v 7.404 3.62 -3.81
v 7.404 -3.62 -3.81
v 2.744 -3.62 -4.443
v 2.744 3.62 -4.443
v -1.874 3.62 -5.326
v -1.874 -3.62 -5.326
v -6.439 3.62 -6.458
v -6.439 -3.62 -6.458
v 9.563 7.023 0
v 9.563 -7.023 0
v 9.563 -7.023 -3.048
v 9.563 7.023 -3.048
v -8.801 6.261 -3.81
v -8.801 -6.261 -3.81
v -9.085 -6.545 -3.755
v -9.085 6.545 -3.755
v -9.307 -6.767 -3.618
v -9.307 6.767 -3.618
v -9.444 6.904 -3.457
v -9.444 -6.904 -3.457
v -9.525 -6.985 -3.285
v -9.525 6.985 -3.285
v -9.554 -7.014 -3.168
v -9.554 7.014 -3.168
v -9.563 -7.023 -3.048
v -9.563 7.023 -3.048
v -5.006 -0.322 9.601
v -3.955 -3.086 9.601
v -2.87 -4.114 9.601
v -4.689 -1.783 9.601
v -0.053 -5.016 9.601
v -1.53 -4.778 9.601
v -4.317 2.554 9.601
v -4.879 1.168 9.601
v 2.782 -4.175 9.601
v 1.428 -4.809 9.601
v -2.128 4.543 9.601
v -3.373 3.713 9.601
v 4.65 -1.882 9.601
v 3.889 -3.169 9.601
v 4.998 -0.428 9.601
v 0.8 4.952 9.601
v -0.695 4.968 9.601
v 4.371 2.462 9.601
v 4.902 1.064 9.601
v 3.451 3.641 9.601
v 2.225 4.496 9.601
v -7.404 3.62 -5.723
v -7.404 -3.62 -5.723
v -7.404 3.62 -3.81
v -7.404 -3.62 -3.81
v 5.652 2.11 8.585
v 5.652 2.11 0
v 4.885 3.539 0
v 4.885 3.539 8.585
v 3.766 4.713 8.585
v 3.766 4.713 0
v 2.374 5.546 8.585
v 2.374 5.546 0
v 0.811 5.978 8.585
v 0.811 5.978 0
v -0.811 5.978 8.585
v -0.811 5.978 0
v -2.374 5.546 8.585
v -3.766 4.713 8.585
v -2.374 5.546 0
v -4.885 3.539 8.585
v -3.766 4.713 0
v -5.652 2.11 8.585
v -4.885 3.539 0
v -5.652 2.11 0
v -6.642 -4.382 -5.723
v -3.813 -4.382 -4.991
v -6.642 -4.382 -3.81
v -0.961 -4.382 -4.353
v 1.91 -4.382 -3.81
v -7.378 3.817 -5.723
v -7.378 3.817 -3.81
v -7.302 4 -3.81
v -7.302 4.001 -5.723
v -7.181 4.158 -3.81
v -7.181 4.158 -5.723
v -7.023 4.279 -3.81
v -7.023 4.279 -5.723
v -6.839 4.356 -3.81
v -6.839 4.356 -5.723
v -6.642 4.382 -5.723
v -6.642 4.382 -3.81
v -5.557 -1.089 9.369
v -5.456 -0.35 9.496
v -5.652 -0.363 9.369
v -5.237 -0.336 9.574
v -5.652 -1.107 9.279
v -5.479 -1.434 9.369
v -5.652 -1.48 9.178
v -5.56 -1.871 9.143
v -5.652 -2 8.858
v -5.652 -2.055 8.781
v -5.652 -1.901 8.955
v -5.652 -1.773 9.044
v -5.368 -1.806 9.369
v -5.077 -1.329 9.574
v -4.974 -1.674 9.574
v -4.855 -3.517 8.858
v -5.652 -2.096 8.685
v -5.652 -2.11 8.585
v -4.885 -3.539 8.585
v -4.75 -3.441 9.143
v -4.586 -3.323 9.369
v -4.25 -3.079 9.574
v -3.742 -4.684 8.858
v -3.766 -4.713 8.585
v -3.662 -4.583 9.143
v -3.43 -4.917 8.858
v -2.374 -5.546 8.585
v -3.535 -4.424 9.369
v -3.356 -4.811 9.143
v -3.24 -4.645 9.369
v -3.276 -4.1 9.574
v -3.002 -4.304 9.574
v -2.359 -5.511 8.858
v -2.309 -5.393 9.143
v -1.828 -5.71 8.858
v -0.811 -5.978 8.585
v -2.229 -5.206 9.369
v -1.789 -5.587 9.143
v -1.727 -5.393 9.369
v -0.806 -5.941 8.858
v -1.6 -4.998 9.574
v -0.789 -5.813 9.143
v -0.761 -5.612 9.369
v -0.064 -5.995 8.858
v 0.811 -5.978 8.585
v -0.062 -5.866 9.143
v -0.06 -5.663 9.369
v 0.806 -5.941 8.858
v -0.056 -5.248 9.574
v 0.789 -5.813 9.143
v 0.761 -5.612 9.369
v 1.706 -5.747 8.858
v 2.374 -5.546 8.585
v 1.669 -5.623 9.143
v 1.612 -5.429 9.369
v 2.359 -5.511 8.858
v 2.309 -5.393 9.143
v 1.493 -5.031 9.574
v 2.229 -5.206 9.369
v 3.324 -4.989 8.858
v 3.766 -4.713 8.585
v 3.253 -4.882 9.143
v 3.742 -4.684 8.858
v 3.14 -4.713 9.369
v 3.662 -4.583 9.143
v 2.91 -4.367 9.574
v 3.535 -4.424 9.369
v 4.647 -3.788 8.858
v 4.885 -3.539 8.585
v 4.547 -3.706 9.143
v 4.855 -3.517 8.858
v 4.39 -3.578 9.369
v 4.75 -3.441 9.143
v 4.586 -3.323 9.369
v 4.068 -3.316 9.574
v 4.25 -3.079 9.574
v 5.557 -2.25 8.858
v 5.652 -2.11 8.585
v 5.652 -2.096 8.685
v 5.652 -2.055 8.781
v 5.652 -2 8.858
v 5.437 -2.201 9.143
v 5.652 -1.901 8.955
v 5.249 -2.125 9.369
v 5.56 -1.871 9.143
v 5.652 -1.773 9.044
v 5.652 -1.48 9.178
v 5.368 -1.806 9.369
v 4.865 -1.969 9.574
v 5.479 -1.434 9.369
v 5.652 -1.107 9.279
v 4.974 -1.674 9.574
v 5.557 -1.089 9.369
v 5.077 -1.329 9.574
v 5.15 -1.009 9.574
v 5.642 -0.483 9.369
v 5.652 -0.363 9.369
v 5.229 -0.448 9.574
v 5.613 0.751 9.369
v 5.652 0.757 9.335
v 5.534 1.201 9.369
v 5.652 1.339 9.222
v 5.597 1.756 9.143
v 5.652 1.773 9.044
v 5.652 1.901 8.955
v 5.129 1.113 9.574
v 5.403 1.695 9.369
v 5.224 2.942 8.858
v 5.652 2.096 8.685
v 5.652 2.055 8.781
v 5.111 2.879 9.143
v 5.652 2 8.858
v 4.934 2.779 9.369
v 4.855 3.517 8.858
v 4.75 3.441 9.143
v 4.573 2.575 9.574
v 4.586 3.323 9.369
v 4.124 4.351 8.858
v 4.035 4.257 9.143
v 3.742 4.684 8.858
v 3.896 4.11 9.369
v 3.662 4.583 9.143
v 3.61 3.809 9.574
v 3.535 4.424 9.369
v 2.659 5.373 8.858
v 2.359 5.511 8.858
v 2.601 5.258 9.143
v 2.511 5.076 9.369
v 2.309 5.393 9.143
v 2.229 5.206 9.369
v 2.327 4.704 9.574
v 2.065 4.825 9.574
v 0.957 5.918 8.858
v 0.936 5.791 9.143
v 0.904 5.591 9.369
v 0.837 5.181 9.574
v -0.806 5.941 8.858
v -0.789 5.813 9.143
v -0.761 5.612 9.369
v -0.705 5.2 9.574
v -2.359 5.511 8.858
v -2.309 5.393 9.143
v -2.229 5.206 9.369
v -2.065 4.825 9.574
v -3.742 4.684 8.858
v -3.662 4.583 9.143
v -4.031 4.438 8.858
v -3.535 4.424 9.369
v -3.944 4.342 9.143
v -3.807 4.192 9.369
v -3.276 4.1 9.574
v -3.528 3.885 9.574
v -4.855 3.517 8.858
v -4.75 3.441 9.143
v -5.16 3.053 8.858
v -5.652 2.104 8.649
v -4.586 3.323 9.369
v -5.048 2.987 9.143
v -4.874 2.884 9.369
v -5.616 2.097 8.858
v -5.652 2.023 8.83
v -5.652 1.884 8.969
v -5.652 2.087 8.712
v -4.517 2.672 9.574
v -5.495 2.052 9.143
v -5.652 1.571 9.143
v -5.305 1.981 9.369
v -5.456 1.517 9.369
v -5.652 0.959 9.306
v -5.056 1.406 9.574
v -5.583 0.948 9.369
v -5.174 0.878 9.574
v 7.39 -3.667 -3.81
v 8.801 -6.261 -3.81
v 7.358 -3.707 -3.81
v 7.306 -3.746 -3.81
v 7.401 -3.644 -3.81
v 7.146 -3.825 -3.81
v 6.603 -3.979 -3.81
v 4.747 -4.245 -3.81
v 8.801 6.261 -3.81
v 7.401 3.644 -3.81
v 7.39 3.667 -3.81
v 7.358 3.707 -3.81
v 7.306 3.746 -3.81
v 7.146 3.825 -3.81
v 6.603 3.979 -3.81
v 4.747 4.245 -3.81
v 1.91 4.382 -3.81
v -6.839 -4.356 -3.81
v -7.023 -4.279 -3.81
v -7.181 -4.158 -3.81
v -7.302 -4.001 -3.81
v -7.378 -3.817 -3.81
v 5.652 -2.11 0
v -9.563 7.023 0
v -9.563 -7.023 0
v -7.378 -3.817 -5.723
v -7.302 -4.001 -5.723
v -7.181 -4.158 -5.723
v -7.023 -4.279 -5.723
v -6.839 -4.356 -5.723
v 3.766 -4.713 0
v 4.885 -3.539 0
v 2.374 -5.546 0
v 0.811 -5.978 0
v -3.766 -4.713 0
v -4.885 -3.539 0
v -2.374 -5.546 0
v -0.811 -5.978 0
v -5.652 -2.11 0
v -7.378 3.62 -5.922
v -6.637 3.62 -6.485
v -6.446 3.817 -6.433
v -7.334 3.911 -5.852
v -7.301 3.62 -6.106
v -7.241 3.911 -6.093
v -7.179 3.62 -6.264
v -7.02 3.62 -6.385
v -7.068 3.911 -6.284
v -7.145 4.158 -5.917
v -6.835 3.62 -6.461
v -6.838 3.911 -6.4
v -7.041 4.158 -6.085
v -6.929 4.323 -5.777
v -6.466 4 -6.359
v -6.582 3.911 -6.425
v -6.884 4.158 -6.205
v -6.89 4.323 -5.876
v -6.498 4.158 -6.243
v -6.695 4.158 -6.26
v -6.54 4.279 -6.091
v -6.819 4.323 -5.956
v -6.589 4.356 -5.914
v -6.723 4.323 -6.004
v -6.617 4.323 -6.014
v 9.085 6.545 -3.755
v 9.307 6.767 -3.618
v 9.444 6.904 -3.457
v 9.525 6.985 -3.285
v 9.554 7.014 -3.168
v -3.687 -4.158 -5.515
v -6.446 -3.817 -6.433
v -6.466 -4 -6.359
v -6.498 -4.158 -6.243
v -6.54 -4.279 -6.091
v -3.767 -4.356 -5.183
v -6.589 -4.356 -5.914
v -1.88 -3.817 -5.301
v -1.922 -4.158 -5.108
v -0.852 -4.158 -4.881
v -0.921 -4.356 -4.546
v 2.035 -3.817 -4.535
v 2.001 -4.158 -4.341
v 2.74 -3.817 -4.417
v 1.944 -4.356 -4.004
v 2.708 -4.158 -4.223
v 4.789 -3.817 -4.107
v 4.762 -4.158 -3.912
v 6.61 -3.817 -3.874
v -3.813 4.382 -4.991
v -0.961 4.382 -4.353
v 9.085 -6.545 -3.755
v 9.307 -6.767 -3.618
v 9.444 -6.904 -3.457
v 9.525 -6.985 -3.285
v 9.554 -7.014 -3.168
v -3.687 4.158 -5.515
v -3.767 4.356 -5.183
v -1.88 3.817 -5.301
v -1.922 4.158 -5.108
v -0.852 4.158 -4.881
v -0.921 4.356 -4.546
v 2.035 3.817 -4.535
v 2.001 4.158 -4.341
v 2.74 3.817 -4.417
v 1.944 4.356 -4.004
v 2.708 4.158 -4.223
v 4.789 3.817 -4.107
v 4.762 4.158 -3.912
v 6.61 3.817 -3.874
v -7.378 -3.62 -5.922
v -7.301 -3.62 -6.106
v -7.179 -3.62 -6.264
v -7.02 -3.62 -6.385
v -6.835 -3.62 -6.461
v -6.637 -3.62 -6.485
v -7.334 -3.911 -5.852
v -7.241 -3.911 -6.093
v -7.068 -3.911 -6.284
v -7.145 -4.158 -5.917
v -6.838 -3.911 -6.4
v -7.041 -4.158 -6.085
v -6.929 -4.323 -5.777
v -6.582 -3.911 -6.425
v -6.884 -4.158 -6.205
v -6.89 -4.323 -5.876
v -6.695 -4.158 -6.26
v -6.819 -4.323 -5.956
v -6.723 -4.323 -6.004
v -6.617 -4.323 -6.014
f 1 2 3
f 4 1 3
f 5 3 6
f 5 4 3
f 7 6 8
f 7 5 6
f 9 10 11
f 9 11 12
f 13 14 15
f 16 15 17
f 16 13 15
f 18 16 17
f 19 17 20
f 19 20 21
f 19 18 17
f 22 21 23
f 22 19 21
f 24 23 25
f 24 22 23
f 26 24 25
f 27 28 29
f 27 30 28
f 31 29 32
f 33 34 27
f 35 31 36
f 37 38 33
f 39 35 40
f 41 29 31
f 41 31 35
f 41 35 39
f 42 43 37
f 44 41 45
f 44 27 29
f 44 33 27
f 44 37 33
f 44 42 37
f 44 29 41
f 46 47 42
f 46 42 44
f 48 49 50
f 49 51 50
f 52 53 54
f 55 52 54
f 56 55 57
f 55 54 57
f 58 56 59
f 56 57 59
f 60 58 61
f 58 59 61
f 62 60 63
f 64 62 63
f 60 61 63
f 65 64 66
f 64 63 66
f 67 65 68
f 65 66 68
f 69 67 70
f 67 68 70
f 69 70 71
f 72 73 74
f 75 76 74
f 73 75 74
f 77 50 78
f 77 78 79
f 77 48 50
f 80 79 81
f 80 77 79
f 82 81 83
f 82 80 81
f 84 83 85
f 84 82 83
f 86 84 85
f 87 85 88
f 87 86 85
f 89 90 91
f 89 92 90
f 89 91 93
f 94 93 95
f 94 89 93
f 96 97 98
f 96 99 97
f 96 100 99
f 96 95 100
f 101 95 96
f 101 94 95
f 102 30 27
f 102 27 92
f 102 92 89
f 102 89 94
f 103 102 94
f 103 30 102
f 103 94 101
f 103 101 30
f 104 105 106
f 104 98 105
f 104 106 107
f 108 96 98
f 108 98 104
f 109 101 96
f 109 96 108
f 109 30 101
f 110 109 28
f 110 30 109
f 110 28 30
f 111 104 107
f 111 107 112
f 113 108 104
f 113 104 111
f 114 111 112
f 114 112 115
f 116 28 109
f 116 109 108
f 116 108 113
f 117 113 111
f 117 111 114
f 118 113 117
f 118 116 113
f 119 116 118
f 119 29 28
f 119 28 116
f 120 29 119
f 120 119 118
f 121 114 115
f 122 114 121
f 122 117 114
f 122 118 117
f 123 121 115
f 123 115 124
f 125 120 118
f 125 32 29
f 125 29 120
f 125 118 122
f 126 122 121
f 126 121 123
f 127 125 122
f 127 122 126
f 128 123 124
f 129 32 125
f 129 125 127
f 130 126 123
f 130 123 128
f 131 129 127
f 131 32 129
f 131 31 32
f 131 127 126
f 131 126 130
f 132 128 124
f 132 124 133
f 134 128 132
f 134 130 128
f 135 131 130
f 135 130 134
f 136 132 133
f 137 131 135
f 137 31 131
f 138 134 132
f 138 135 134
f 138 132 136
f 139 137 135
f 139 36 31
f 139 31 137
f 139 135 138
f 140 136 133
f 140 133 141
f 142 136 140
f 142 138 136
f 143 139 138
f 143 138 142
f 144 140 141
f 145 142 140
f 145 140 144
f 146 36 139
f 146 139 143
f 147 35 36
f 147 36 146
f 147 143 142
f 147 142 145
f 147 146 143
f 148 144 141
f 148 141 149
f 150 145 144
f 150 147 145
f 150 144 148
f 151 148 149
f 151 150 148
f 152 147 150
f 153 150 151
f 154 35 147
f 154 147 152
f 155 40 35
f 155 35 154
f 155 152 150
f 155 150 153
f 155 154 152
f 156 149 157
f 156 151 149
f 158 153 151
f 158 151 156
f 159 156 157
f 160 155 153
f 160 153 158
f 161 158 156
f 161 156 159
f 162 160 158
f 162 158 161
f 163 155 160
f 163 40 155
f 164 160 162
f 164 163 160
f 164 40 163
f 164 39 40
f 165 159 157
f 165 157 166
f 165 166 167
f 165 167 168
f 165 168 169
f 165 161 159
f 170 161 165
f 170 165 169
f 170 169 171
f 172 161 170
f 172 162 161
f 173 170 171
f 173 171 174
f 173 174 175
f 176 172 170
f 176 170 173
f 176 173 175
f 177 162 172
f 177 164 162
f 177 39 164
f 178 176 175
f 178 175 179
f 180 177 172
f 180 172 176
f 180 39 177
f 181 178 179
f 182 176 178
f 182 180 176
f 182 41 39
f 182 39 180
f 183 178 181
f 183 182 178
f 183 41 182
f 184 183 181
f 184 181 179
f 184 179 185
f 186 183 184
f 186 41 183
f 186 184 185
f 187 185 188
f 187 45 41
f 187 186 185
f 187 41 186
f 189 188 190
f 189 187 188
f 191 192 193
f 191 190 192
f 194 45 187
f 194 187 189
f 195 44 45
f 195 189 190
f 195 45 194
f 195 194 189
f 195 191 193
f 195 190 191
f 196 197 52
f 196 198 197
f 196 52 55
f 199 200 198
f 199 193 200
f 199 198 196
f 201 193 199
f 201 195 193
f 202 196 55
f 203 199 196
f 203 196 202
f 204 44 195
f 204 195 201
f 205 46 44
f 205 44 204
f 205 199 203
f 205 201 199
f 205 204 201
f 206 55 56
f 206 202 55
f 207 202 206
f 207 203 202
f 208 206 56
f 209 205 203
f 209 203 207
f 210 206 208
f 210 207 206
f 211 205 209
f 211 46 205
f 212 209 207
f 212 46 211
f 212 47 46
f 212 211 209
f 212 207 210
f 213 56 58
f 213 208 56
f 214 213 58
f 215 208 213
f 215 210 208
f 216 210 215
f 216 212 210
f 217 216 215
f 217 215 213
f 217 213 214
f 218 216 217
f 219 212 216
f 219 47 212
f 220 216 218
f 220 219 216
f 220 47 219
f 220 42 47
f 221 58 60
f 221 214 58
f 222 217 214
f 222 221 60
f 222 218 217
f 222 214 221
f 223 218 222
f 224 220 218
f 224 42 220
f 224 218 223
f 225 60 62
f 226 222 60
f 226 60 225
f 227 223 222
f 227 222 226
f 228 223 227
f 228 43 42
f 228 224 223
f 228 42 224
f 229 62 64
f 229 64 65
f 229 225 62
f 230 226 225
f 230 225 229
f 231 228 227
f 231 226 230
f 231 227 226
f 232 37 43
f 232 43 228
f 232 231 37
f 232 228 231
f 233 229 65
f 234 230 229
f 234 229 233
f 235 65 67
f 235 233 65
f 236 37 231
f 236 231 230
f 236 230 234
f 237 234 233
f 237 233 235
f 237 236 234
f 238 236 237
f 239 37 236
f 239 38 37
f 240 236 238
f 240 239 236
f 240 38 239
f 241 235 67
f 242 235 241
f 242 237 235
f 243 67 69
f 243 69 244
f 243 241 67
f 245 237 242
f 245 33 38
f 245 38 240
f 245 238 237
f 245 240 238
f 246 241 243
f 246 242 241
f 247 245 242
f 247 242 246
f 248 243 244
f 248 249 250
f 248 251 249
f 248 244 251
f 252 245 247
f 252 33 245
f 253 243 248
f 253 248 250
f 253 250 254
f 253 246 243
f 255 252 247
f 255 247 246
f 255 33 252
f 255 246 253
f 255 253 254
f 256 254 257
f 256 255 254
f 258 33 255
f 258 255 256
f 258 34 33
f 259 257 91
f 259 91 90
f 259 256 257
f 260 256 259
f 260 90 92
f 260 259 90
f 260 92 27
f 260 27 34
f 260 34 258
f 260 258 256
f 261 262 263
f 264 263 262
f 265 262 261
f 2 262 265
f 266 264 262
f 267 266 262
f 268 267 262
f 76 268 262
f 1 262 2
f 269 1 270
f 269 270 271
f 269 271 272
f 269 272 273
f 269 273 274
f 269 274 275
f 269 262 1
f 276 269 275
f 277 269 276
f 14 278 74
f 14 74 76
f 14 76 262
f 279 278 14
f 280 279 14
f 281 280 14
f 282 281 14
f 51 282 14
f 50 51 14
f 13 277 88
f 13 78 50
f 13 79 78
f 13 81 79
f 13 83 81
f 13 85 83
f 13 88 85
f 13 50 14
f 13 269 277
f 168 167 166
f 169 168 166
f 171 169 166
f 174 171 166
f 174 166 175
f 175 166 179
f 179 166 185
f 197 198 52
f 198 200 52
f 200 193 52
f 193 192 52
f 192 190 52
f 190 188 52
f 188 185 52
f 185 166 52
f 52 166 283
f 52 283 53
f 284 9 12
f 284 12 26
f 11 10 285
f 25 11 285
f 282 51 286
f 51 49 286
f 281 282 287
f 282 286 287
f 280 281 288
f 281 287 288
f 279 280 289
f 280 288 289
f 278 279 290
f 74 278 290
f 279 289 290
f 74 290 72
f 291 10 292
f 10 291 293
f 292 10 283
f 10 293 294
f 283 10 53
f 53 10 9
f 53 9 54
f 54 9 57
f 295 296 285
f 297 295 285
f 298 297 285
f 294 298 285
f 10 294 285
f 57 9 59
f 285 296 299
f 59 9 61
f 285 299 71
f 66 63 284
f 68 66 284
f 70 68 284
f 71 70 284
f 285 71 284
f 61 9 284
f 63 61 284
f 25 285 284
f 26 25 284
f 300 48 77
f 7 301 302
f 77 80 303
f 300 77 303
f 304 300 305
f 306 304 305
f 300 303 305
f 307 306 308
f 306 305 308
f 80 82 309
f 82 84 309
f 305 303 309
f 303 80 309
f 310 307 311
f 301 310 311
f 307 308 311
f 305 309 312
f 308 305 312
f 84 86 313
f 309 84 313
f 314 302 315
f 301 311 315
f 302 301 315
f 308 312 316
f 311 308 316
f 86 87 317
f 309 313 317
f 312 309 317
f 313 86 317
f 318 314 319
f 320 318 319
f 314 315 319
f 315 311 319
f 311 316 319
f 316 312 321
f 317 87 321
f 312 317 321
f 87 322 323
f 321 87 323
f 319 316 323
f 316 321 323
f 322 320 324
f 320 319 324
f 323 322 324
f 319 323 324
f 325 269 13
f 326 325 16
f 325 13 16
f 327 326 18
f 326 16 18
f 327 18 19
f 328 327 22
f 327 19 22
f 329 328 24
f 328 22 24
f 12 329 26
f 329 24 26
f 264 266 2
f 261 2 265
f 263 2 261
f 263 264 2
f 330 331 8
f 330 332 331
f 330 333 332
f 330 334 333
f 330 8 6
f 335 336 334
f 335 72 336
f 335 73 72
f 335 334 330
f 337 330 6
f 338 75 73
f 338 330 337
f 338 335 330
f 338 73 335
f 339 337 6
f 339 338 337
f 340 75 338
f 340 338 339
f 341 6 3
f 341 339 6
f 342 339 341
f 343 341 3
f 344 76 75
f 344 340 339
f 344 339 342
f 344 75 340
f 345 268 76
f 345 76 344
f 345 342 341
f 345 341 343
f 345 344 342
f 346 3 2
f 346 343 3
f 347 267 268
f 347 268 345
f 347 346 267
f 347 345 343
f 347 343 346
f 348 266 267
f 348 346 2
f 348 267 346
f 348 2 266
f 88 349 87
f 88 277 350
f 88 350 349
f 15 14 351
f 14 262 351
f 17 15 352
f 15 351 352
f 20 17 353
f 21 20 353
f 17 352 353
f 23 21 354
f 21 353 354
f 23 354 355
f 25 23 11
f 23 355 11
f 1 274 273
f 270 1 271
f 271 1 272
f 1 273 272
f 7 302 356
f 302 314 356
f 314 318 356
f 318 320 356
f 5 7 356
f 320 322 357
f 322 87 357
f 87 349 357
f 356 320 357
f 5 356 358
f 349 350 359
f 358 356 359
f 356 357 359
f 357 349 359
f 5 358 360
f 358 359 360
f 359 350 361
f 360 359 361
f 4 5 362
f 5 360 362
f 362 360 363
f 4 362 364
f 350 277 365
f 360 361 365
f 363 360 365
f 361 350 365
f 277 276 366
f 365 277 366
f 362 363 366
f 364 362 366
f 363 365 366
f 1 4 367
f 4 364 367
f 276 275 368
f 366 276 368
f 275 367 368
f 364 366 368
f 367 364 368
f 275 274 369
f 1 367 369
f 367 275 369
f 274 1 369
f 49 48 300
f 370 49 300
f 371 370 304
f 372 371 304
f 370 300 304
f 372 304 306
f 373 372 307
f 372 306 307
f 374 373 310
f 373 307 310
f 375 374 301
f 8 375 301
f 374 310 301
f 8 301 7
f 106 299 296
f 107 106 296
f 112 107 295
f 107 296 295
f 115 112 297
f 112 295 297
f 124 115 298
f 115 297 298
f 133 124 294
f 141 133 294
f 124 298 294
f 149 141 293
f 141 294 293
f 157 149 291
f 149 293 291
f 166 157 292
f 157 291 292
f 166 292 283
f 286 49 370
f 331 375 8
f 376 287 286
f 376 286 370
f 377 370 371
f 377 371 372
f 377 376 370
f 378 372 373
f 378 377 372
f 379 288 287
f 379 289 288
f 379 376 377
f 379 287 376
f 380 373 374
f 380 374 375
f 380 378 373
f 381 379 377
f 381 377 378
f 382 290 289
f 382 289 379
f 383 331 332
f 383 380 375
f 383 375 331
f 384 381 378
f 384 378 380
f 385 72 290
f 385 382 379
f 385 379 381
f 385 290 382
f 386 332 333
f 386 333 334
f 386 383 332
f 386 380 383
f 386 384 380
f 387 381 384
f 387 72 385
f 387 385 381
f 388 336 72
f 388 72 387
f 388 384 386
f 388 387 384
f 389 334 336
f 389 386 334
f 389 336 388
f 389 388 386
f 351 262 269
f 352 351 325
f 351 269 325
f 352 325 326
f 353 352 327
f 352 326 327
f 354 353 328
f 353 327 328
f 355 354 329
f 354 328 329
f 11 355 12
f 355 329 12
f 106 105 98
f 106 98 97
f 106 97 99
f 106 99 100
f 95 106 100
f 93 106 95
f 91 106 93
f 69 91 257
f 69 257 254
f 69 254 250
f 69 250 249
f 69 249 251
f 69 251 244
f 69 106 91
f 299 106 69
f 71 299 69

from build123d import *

# Parameters (mm, degrees)
SKETCH1_W               = 11.303
SKETCH1_H               = 4.219764922
BOSS_EXTRUDE1_DEPTH     = 9.6012
SKETCH2_W               = 19.1262
SKETCH2_H               = 14.0462
BOSS_EXTRUDE2_DEPTH     = 3.81
SKETCH3_W               = 14.8082
SKETCH3_H               = 8.763
BOSS_EXTRUDE3_DEPTH     = 2.921
CUT_EXTRUDE1_DEPTH      = 18.711601402
CUT_EXTRUDE1_DEPTH_BACK = 18.711601402
FILLET1_R               = 0.762
FILLET2_R               = 0.762
FILLET3_R               = 0.762
FILLET4_R               = 1.016


with BuildPart() as part:
    # Sketch1 → Boss-Extrude1 (new body)
    with BuildSketch(Plane.XY):
        with BuildLine():
            ThreePointArc((5.6515, 2.109882461), (0, 6.0325), (-5.6515, 2.109882461))
            Line((-5.6515, 2.109882461), (5.6515, 2.109882461))
        make_face()
        Rectangle(SKETCH1_W, SKETCH1_H)
        with BuildLine():
            Line((5.6515, -2.109882461), (-5.6515, -2.109882461))
            ThreePointArc((-5.6515, -2.109882461), (0, -6.0325), (5.6515, -2.109882461))
        make_face()
    extrude(amount=BOSS_EXTRUDE1_DEPTH)

    # Sketch2 → Boss-Extrude2 (add)
    with BuildSketch(Plane(origin=(0, 0, 0), x_dir=(-1, 0, 0), z_dir=(0, 0, -1))):
        Rectangle(SKETCH2_W, SKETCH2_H)
    extrude(amount=BOSS_EXTRUDE2_DEPTH)

    # Sketch3 → Boss-Extrude3 (add)
    with BuildSketch(Plane(origin=(0, 0, -3.81), x_dir=(-1, 0, 0), z_dir=(0, 0, -1))):
        Rectangle(SKETCH3_W, SKETCH3_H)
    extrude(amount=BOSS_EXTRUDE3_DEPTH)

    # Sketch4 → Cut-Extrude1 (cut, two sides: drawn at the far end of the back side and taken through both)
    with BuildSketch(Plane.XZ.offset(4.3815).offset(-CUT_EXTRUDE1_DEPTH_BACK)):
        with BuildLine():
            Line((7.4041, -6.731), (7.4041, -3.81))
            ThreePointArc((7.4041, -3.81), (-0.063420224, -4.948987039), (-7.4041, -6.731))
            Line((-7.4041, -6.731), (7.4041, -6.731))
        make_face()
    extrude(amount=CUT_EXTRUDE1_DEPTH + CUT_EXTRUDE1_DEPTH_BACK, mode=Mode.SUBTRACT)

    # Fillet1
    fillet1_edges = [part.edges().sort_by_distance(p)[0] for p in [
        (-7.4041, 0, -6.731),
    ]]
    fillet(fillet1_edges, radius=FILLET1_R)

    # Fillet2
    fillet2_edges = [part.edges().sort_by_distance(p)[0] for p in [
        (-9.5631, 0, -3.81),
        (0, 7.0231, -3.81),
        (9.5631, 0, -3.81),
        (0, -7.0231, -3.81),
    ]]
    fillet(fillet2_edges, radius=FILLET2_R)

    # Fillet3
    fillet3_edges = [part.edges().sort_by_distance(p)[0] for p in [
        (0.428965251, -4.3815, -4.853334027),
        (0.428965251, 4.3815, -4.853334027),
        (-7.4041, 4.3815, -4.766721364),
        (-7.103485869, 4.3815, -6.329880754),
        (-7.4041, -4.3815, -4.766721364),
        (-7.103485869, -4.3815, -6.329880754),
    ]]
    fillet(fillet3_edges, radius=FILLET3_R)

    # Fillet4
    # the kernel refuses this fillet: 1.016 mm, written as the material it takes off along each edge
    with BuildSketch(Plane(origin=(0, 0, 9.6012), x_dir=(0.9979431218880589, -0.06410558069555868, 0), z_dir=(-0.06410558069555868, -0.9979431218880589, 0))) as fillet4_piece_1:
        with BuildLine():
            CenterArc((6.0325 - FILLET4_R, -FILLET4_R), FILLET4_R, 0, 90)
            Line((6.0325 - FILLET4_R, 0), (6.0325, 0))
            Line((6.0325, 0), (6.0325, -FILLET4_R))
        make_face()
    revolve(axis=Axis((0, 0, 9.6012), (0, 0, 1)), revolution_arc=187.350999162, mode=Mode.SUBTRACT)
    with BuildSketch(Plane(origin=(0, 0, 9.6012), x_dir=(-0.9979431218880589, 0.06410558069555859, 0), z_dir=(0.06410558069555859, 0.9979431218880589, 0))) as fillet4_piece_2:
        with BuildLine():
            CenterArc((6.0325 - FILLET4_R, -FILLET4_R), FILLET4_R, 0, 90)
            Line((6.0325 - FILLET4_R, 0), (6.0325, 0))
            Line((6.0325, 0), (6.0325, -FILLET4_R))
        make_face()
    revolve(axis=Axis((0, 0, 9.6012), (0, 0, 1)), revolution_arc=187.350999162, mode=Mode.SUBTRACT)


solid = part.part
